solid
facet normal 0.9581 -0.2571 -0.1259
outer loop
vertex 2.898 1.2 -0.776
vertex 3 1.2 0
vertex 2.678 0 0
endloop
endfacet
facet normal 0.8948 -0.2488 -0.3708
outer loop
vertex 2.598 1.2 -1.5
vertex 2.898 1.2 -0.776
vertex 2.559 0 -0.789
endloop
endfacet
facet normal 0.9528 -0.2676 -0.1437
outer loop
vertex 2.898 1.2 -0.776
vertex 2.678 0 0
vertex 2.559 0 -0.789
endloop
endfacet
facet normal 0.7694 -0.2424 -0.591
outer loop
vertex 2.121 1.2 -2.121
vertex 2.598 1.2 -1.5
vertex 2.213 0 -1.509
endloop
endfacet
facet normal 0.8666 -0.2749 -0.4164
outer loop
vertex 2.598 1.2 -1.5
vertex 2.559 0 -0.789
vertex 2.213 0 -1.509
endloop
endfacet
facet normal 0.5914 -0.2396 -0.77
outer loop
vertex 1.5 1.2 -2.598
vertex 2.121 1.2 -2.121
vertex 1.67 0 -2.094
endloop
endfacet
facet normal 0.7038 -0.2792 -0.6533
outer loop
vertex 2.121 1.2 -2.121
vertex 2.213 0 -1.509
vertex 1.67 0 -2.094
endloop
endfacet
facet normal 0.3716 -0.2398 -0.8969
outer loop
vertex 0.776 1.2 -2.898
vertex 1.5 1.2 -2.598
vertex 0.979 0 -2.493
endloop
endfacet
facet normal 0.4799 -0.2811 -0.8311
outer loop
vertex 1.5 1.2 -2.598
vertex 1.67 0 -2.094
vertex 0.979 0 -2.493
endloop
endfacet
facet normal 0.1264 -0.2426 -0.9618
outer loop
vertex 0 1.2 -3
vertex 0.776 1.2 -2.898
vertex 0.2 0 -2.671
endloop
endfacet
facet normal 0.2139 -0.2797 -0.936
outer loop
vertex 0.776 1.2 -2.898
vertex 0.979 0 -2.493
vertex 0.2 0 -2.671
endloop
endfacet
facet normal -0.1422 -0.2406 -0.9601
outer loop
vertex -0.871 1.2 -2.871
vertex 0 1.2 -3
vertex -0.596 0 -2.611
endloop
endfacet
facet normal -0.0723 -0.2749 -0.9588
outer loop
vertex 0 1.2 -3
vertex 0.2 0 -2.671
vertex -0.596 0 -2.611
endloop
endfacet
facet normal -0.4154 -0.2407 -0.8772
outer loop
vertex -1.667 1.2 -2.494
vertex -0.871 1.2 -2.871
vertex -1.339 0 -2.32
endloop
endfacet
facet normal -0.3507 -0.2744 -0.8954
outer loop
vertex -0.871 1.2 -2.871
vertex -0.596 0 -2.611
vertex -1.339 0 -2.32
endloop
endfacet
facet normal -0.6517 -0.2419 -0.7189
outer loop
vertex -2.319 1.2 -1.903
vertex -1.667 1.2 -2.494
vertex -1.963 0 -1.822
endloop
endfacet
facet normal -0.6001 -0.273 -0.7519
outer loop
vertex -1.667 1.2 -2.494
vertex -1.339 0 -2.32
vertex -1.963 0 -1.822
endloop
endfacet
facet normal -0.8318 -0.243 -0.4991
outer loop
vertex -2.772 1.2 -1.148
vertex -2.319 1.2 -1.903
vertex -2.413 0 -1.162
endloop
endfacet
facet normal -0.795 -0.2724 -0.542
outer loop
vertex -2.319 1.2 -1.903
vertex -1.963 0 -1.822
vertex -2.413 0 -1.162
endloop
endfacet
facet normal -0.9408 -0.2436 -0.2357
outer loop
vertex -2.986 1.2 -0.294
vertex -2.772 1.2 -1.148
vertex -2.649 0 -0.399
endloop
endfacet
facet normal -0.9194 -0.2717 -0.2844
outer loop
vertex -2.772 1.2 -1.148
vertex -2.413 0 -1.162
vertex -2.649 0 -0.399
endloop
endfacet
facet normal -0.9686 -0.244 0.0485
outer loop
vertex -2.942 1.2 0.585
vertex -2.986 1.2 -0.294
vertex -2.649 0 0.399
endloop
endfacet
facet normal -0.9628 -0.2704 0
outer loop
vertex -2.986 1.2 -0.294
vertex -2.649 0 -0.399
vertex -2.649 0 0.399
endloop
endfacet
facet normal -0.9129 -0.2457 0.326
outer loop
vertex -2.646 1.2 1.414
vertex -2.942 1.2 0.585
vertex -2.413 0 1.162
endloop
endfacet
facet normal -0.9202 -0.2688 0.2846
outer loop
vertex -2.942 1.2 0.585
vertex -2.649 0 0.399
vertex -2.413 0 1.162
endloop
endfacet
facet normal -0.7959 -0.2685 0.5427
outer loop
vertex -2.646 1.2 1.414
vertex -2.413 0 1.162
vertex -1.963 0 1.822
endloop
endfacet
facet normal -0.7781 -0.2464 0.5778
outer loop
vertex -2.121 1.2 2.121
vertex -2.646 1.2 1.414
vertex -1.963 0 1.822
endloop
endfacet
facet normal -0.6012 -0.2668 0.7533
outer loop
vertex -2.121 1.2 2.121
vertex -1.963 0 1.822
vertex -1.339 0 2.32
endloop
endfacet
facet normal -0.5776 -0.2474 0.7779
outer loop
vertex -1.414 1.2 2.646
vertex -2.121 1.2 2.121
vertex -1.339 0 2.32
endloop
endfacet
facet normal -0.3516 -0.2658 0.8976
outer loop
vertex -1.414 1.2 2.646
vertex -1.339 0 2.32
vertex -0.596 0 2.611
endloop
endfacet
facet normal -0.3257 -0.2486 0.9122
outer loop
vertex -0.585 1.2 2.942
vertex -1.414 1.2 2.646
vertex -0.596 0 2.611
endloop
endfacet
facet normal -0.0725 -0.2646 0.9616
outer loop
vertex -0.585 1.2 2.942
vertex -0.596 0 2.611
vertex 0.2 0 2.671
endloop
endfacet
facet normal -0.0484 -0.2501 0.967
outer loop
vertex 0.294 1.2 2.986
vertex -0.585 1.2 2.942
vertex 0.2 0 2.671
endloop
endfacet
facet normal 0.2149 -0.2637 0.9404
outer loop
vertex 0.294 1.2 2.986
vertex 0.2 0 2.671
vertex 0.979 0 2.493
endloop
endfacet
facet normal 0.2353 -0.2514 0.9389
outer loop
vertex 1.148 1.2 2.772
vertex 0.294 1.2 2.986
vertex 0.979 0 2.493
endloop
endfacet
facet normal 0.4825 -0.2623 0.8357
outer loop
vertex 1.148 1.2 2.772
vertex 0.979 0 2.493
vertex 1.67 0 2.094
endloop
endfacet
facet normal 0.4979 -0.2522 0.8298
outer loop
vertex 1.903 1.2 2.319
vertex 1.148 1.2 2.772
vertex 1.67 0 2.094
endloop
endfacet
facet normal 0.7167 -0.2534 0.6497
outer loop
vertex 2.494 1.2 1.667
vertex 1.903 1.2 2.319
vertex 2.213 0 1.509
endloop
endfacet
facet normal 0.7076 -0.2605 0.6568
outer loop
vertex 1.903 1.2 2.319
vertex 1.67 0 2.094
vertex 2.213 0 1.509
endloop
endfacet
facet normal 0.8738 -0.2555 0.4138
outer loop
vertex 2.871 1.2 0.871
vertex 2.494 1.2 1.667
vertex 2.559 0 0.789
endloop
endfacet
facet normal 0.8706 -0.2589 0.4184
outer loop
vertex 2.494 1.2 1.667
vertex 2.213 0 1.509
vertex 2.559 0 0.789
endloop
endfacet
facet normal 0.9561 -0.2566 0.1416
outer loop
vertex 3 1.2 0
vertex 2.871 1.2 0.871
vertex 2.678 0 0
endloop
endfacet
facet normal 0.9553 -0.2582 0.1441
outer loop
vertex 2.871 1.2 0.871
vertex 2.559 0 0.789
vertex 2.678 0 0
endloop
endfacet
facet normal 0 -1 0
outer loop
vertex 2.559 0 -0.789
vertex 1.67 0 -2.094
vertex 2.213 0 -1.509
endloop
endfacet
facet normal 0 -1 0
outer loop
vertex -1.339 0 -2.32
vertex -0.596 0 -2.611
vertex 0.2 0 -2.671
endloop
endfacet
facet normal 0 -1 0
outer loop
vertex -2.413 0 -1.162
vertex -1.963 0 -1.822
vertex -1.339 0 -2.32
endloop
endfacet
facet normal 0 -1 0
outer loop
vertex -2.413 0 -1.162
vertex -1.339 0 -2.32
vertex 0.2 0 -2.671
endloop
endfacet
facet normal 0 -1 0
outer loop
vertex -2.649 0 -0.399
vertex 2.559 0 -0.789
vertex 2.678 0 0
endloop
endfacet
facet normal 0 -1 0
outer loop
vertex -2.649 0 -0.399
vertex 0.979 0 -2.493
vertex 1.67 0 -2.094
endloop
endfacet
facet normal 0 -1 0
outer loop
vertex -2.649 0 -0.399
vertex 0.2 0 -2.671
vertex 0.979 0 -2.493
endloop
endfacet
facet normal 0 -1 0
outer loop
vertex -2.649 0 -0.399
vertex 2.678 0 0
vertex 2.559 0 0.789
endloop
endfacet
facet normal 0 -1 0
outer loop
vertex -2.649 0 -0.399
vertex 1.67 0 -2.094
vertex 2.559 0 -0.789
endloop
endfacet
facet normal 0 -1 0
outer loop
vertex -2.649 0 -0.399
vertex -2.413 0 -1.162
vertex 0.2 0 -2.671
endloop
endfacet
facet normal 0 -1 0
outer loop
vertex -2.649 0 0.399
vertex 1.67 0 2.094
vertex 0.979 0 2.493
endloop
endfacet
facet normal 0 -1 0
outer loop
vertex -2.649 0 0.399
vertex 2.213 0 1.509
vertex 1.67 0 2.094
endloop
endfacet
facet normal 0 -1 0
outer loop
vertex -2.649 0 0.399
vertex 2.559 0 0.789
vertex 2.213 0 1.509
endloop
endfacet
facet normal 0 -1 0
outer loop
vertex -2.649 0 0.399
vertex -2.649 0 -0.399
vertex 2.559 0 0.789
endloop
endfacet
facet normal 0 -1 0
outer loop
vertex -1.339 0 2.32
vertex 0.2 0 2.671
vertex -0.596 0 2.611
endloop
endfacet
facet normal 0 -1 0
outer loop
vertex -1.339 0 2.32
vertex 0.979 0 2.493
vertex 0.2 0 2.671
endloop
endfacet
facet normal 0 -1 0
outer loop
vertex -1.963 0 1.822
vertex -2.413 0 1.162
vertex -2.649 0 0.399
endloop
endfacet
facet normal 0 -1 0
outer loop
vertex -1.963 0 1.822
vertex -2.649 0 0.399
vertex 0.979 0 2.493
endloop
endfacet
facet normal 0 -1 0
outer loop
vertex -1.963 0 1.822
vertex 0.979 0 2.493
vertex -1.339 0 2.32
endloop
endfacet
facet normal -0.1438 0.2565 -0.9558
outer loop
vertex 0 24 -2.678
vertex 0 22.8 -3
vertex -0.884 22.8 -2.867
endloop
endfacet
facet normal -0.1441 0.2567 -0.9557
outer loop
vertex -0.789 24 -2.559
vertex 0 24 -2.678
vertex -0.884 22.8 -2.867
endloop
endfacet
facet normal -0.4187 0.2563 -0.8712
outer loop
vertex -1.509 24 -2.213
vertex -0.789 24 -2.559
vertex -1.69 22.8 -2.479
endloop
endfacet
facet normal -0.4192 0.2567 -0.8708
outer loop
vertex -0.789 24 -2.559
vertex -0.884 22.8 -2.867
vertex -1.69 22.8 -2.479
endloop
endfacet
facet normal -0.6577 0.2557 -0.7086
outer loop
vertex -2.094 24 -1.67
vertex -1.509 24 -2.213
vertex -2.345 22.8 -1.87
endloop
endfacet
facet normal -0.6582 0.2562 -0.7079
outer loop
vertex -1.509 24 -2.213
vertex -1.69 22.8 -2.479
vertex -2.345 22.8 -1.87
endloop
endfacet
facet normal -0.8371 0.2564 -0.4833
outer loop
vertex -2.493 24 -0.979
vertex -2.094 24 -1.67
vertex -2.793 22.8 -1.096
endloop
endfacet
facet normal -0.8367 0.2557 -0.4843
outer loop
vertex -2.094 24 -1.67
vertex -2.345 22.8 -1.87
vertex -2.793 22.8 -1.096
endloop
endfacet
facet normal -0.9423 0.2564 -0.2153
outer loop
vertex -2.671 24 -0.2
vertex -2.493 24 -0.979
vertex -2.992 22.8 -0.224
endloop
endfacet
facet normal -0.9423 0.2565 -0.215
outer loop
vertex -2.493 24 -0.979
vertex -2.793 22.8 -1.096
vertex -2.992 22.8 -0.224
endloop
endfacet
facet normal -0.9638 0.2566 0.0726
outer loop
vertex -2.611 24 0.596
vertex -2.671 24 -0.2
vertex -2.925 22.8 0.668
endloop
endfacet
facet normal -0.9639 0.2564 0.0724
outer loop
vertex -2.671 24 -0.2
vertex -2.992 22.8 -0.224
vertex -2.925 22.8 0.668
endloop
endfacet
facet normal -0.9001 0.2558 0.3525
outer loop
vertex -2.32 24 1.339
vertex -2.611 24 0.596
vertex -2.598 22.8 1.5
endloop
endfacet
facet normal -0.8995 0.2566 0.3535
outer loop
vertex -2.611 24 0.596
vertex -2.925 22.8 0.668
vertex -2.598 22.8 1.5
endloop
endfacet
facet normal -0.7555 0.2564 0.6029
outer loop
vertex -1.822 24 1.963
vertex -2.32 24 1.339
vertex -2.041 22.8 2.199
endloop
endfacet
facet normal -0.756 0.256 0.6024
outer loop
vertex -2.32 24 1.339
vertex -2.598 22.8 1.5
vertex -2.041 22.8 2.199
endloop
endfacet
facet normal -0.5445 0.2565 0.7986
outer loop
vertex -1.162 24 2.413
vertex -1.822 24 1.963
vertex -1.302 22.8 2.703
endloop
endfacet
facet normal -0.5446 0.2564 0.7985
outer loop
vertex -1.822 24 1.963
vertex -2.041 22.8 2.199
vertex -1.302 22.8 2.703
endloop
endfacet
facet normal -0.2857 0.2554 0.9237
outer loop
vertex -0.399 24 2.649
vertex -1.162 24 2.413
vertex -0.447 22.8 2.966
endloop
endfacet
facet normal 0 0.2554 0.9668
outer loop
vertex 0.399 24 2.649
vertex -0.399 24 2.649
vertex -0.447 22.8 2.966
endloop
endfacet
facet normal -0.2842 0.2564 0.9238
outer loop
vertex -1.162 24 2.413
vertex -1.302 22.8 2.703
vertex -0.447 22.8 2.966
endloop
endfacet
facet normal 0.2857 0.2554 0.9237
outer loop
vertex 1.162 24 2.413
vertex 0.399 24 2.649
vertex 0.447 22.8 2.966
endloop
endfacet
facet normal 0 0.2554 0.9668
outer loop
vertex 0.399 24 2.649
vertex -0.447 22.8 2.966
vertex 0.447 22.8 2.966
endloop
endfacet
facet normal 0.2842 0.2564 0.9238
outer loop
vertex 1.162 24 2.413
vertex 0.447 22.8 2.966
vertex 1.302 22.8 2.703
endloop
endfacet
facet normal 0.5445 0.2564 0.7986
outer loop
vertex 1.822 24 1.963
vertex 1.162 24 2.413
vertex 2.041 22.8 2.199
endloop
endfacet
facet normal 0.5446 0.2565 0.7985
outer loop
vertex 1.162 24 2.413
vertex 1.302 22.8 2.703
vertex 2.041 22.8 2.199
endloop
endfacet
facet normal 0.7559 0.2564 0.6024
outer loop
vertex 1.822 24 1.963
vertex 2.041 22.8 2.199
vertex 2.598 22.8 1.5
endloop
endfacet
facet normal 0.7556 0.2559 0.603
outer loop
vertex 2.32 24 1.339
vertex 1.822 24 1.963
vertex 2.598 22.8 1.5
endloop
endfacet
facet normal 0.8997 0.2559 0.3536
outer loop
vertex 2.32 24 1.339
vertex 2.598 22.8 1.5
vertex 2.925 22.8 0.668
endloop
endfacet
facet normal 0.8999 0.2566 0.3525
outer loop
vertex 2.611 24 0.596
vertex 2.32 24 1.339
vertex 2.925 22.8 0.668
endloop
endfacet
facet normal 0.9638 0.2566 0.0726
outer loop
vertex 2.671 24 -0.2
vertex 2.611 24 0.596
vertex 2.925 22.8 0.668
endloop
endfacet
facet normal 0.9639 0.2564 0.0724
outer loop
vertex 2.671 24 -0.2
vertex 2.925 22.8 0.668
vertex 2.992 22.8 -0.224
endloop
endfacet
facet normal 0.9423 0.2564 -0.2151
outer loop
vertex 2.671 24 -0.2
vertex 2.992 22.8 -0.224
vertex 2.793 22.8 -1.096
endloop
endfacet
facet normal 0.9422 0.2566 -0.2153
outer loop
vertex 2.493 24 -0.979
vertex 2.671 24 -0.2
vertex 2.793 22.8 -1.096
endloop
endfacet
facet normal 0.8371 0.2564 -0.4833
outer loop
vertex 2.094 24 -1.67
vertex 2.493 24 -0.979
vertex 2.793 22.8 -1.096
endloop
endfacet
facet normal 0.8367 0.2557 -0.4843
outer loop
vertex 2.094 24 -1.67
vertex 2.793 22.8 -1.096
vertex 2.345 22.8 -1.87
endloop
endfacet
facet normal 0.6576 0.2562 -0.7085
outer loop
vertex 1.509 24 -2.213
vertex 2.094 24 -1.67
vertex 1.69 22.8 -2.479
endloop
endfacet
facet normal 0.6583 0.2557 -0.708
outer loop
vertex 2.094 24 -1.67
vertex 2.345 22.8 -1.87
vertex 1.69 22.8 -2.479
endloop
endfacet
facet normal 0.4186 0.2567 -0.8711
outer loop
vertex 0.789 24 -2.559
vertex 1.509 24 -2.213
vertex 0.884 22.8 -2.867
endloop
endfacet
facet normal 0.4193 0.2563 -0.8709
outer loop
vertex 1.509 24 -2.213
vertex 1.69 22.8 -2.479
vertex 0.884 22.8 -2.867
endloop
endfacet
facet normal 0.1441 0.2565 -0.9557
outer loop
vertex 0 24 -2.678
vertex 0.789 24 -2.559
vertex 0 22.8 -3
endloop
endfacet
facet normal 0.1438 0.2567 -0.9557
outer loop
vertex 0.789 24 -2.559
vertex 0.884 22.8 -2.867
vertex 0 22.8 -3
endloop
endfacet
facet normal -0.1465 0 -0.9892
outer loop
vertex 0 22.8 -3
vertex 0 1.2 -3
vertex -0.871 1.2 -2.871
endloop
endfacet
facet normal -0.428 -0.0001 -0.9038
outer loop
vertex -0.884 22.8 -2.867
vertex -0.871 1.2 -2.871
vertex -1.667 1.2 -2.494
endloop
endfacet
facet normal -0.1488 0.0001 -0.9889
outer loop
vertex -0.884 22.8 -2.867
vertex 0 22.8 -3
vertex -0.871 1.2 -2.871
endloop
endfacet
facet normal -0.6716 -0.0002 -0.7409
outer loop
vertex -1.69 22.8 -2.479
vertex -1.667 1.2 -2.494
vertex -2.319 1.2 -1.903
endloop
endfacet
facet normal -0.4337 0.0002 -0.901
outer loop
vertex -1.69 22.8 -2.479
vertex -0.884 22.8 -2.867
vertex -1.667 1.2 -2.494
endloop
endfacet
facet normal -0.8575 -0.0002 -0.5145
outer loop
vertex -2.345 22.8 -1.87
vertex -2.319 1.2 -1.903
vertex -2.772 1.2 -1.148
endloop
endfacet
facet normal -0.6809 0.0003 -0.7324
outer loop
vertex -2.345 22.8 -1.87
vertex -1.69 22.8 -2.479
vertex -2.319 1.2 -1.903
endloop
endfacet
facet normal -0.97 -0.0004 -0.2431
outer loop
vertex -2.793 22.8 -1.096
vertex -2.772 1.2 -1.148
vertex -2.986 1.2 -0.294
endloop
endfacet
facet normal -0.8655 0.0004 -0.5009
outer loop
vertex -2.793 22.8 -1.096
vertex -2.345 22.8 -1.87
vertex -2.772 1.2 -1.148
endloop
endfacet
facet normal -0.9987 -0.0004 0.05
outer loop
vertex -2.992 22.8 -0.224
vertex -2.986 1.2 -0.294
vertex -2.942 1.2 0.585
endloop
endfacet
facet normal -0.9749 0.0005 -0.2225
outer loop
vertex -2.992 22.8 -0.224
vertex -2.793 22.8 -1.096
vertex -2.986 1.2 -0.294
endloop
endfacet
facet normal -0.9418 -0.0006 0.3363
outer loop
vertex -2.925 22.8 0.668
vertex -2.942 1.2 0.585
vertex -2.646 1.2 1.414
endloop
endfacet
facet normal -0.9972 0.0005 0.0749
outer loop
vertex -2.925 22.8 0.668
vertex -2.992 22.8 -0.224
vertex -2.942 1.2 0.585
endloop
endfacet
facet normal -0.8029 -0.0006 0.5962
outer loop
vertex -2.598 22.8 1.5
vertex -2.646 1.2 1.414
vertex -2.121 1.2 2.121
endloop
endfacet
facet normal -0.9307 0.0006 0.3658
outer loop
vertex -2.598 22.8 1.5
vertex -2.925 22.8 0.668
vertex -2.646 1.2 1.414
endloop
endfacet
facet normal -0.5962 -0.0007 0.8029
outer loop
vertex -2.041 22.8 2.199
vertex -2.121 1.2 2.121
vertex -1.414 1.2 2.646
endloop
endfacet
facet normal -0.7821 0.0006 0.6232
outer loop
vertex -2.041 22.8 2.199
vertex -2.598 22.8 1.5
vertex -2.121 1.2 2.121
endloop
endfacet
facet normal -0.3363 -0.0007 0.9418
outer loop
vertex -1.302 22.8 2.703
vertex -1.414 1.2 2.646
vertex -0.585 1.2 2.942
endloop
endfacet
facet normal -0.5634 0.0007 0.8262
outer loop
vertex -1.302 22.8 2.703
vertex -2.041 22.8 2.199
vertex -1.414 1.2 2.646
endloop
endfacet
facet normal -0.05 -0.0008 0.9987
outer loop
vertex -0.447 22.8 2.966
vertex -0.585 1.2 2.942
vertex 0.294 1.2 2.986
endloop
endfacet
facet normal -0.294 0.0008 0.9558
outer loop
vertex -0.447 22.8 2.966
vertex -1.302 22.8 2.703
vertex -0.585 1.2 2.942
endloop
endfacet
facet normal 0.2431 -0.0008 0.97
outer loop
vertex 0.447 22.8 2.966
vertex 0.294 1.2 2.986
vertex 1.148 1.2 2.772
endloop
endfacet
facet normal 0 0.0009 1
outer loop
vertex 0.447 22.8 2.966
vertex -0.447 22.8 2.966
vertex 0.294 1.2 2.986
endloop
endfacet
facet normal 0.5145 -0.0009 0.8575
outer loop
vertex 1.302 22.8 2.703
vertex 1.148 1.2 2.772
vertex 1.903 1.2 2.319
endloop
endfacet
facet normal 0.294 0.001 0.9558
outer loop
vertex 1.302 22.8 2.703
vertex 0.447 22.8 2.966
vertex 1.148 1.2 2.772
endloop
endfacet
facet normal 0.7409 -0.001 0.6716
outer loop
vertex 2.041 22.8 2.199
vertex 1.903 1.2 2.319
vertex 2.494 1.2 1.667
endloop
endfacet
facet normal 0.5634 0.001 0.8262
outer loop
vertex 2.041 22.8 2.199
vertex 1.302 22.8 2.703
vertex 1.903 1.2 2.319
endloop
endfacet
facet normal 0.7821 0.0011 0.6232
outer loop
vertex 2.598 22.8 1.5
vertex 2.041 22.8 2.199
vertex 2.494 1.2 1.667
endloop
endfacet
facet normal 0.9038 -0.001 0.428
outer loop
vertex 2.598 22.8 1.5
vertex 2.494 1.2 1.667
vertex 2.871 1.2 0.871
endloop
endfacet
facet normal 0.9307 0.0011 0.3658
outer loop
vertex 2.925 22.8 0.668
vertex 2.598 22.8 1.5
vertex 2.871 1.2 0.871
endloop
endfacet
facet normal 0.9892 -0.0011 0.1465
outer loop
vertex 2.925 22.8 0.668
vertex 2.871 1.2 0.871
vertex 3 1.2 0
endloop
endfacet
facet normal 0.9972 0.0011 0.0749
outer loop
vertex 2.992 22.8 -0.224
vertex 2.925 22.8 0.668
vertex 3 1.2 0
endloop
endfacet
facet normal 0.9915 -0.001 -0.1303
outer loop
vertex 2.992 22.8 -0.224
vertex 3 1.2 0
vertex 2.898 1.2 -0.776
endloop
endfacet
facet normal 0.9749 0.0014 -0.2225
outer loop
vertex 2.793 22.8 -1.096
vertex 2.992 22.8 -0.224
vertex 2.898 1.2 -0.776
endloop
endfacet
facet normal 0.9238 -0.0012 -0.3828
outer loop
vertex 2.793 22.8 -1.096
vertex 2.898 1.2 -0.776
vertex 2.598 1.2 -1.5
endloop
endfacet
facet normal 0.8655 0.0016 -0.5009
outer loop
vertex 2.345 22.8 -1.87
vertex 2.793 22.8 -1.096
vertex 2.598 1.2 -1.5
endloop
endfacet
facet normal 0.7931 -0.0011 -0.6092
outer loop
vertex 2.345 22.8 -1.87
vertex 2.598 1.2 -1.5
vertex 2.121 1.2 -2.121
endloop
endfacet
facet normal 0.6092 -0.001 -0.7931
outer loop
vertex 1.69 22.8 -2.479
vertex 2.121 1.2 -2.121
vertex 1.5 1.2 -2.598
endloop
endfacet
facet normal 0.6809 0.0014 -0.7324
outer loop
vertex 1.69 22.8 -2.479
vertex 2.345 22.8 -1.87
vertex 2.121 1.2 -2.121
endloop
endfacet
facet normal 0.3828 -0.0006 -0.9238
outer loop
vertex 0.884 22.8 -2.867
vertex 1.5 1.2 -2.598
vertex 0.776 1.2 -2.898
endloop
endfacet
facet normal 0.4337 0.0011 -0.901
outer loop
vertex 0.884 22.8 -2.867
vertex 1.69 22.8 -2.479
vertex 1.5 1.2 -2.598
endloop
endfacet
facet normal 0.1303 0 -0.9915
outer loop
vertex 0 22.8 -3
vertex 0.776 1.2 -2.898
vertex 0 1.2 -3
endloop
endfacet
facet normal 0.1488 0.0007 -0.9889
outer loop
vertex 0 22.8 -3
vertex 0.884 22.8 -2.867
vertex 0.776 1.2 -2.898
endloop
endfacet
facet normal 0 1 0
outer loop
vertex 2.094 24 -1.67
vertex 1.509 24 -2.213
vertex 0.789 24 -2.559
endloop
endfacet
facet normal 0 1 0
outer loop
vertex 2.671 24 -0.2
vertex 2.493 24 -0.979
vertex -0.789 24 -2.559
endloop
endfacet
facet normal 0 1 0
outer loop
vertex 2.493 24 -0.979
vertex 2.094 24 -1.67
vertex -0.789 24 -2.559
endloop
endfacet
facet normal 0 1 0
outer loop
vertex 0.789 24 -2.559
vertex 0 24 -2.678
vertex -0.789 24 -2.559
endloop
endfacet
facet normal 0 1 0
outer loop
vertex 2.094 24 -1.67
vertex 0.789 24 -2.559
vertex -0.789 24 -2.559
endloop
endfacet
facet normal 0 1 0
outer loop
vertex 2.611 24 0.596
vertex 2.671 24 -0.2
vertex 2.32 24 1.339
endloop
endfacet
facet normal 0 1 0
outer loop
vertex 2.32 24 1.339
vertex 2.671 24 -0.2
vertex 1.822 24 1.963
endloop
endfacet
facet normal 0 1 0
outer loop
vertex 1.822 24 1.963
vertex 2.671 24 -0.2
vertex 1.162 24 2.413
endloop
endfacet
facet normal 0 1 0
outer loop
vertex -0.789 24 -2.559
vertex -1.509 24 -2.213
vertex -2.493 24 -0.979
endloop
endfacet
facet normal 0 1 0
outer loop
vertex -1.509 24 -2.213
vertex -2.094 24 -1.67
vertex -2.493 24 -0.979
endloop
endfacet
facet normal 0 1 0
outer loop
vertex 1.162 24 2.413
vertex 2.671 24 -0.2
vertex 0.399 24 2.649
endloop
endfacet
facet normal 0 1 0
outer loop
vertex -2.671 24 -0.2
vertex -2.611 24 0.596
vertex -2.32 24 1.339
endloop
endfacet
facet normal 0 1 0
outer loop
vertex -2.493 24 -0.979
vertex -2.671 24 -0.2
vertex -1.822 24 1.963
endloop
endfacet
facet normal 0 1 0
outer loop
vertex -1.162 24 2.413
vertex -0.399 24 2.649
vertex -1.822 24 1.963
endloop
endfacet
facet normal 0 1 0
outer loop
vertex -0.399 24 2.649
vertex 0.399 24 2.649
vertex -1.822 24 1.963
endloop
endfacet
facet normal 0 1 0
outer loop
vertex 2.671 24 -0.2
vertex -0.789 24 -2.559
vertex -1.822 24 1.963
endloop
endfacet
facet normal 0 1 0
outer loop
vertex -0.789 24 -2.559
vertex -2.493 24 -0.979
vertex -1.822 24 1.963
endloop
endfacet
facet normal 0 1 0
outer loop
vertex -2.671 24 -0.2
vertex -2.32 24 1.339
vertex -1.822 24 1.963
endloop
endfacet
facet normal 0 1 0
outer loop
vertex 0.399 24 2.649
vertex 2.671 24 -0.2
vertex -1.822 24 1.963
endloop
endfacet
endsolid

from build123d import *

# Parameters (mm, degrees)
SKE_W          = 3
SKE_H          = 24
CHAMFER2_SIZE  = 1.2
CHAMFER2_SIZE2 = 0.321539031
CHAMFER1_SIZE  = 1.2
CHAMFER1_SIZE2 = 0.321539031


with BuildPart() as part:
    # Ske → Base-Rev (revolve)
    with BuildSketch(Plane.XY):
        with Locations((1.5, 12)):
            Rectangle(SKE_W, SKE_H)
    revolve(axis=Axis((0, 0, 0), (0, 1, 0)))

    # Chamfer2
    chamfer2_edges = [part.edges().sort_by_distance(p)[0] for p in [
        (-3, 0, 0),
    ]]
    chamfer2_side = [part.faces().sort_by_distance(p)[0] for p in [
        (-3, 12, 0),
    ]]
    chamfer(chamfer2_edges, length=CHAMFER2_SIZE, length2=CHAMFER2_SIZE2, reference=chamfer2_side[0])

    # Chamfer1
    chamfer1_edges = [part.edges().sort_by_distance(p)[0] for p in [
        (-3, 24, 0),
    ]]
    chamfer1_side = [part.faces().sort_by_distance(p)[0] for p in [
        (-3, 12.6, 0),
    ]]
    chamfer(chamfer1_edges, length=CHAMFER1_SIZE, length2=CHAMFER1_SIZE2, reference=chamfer1_side[0])


solid = part.part
